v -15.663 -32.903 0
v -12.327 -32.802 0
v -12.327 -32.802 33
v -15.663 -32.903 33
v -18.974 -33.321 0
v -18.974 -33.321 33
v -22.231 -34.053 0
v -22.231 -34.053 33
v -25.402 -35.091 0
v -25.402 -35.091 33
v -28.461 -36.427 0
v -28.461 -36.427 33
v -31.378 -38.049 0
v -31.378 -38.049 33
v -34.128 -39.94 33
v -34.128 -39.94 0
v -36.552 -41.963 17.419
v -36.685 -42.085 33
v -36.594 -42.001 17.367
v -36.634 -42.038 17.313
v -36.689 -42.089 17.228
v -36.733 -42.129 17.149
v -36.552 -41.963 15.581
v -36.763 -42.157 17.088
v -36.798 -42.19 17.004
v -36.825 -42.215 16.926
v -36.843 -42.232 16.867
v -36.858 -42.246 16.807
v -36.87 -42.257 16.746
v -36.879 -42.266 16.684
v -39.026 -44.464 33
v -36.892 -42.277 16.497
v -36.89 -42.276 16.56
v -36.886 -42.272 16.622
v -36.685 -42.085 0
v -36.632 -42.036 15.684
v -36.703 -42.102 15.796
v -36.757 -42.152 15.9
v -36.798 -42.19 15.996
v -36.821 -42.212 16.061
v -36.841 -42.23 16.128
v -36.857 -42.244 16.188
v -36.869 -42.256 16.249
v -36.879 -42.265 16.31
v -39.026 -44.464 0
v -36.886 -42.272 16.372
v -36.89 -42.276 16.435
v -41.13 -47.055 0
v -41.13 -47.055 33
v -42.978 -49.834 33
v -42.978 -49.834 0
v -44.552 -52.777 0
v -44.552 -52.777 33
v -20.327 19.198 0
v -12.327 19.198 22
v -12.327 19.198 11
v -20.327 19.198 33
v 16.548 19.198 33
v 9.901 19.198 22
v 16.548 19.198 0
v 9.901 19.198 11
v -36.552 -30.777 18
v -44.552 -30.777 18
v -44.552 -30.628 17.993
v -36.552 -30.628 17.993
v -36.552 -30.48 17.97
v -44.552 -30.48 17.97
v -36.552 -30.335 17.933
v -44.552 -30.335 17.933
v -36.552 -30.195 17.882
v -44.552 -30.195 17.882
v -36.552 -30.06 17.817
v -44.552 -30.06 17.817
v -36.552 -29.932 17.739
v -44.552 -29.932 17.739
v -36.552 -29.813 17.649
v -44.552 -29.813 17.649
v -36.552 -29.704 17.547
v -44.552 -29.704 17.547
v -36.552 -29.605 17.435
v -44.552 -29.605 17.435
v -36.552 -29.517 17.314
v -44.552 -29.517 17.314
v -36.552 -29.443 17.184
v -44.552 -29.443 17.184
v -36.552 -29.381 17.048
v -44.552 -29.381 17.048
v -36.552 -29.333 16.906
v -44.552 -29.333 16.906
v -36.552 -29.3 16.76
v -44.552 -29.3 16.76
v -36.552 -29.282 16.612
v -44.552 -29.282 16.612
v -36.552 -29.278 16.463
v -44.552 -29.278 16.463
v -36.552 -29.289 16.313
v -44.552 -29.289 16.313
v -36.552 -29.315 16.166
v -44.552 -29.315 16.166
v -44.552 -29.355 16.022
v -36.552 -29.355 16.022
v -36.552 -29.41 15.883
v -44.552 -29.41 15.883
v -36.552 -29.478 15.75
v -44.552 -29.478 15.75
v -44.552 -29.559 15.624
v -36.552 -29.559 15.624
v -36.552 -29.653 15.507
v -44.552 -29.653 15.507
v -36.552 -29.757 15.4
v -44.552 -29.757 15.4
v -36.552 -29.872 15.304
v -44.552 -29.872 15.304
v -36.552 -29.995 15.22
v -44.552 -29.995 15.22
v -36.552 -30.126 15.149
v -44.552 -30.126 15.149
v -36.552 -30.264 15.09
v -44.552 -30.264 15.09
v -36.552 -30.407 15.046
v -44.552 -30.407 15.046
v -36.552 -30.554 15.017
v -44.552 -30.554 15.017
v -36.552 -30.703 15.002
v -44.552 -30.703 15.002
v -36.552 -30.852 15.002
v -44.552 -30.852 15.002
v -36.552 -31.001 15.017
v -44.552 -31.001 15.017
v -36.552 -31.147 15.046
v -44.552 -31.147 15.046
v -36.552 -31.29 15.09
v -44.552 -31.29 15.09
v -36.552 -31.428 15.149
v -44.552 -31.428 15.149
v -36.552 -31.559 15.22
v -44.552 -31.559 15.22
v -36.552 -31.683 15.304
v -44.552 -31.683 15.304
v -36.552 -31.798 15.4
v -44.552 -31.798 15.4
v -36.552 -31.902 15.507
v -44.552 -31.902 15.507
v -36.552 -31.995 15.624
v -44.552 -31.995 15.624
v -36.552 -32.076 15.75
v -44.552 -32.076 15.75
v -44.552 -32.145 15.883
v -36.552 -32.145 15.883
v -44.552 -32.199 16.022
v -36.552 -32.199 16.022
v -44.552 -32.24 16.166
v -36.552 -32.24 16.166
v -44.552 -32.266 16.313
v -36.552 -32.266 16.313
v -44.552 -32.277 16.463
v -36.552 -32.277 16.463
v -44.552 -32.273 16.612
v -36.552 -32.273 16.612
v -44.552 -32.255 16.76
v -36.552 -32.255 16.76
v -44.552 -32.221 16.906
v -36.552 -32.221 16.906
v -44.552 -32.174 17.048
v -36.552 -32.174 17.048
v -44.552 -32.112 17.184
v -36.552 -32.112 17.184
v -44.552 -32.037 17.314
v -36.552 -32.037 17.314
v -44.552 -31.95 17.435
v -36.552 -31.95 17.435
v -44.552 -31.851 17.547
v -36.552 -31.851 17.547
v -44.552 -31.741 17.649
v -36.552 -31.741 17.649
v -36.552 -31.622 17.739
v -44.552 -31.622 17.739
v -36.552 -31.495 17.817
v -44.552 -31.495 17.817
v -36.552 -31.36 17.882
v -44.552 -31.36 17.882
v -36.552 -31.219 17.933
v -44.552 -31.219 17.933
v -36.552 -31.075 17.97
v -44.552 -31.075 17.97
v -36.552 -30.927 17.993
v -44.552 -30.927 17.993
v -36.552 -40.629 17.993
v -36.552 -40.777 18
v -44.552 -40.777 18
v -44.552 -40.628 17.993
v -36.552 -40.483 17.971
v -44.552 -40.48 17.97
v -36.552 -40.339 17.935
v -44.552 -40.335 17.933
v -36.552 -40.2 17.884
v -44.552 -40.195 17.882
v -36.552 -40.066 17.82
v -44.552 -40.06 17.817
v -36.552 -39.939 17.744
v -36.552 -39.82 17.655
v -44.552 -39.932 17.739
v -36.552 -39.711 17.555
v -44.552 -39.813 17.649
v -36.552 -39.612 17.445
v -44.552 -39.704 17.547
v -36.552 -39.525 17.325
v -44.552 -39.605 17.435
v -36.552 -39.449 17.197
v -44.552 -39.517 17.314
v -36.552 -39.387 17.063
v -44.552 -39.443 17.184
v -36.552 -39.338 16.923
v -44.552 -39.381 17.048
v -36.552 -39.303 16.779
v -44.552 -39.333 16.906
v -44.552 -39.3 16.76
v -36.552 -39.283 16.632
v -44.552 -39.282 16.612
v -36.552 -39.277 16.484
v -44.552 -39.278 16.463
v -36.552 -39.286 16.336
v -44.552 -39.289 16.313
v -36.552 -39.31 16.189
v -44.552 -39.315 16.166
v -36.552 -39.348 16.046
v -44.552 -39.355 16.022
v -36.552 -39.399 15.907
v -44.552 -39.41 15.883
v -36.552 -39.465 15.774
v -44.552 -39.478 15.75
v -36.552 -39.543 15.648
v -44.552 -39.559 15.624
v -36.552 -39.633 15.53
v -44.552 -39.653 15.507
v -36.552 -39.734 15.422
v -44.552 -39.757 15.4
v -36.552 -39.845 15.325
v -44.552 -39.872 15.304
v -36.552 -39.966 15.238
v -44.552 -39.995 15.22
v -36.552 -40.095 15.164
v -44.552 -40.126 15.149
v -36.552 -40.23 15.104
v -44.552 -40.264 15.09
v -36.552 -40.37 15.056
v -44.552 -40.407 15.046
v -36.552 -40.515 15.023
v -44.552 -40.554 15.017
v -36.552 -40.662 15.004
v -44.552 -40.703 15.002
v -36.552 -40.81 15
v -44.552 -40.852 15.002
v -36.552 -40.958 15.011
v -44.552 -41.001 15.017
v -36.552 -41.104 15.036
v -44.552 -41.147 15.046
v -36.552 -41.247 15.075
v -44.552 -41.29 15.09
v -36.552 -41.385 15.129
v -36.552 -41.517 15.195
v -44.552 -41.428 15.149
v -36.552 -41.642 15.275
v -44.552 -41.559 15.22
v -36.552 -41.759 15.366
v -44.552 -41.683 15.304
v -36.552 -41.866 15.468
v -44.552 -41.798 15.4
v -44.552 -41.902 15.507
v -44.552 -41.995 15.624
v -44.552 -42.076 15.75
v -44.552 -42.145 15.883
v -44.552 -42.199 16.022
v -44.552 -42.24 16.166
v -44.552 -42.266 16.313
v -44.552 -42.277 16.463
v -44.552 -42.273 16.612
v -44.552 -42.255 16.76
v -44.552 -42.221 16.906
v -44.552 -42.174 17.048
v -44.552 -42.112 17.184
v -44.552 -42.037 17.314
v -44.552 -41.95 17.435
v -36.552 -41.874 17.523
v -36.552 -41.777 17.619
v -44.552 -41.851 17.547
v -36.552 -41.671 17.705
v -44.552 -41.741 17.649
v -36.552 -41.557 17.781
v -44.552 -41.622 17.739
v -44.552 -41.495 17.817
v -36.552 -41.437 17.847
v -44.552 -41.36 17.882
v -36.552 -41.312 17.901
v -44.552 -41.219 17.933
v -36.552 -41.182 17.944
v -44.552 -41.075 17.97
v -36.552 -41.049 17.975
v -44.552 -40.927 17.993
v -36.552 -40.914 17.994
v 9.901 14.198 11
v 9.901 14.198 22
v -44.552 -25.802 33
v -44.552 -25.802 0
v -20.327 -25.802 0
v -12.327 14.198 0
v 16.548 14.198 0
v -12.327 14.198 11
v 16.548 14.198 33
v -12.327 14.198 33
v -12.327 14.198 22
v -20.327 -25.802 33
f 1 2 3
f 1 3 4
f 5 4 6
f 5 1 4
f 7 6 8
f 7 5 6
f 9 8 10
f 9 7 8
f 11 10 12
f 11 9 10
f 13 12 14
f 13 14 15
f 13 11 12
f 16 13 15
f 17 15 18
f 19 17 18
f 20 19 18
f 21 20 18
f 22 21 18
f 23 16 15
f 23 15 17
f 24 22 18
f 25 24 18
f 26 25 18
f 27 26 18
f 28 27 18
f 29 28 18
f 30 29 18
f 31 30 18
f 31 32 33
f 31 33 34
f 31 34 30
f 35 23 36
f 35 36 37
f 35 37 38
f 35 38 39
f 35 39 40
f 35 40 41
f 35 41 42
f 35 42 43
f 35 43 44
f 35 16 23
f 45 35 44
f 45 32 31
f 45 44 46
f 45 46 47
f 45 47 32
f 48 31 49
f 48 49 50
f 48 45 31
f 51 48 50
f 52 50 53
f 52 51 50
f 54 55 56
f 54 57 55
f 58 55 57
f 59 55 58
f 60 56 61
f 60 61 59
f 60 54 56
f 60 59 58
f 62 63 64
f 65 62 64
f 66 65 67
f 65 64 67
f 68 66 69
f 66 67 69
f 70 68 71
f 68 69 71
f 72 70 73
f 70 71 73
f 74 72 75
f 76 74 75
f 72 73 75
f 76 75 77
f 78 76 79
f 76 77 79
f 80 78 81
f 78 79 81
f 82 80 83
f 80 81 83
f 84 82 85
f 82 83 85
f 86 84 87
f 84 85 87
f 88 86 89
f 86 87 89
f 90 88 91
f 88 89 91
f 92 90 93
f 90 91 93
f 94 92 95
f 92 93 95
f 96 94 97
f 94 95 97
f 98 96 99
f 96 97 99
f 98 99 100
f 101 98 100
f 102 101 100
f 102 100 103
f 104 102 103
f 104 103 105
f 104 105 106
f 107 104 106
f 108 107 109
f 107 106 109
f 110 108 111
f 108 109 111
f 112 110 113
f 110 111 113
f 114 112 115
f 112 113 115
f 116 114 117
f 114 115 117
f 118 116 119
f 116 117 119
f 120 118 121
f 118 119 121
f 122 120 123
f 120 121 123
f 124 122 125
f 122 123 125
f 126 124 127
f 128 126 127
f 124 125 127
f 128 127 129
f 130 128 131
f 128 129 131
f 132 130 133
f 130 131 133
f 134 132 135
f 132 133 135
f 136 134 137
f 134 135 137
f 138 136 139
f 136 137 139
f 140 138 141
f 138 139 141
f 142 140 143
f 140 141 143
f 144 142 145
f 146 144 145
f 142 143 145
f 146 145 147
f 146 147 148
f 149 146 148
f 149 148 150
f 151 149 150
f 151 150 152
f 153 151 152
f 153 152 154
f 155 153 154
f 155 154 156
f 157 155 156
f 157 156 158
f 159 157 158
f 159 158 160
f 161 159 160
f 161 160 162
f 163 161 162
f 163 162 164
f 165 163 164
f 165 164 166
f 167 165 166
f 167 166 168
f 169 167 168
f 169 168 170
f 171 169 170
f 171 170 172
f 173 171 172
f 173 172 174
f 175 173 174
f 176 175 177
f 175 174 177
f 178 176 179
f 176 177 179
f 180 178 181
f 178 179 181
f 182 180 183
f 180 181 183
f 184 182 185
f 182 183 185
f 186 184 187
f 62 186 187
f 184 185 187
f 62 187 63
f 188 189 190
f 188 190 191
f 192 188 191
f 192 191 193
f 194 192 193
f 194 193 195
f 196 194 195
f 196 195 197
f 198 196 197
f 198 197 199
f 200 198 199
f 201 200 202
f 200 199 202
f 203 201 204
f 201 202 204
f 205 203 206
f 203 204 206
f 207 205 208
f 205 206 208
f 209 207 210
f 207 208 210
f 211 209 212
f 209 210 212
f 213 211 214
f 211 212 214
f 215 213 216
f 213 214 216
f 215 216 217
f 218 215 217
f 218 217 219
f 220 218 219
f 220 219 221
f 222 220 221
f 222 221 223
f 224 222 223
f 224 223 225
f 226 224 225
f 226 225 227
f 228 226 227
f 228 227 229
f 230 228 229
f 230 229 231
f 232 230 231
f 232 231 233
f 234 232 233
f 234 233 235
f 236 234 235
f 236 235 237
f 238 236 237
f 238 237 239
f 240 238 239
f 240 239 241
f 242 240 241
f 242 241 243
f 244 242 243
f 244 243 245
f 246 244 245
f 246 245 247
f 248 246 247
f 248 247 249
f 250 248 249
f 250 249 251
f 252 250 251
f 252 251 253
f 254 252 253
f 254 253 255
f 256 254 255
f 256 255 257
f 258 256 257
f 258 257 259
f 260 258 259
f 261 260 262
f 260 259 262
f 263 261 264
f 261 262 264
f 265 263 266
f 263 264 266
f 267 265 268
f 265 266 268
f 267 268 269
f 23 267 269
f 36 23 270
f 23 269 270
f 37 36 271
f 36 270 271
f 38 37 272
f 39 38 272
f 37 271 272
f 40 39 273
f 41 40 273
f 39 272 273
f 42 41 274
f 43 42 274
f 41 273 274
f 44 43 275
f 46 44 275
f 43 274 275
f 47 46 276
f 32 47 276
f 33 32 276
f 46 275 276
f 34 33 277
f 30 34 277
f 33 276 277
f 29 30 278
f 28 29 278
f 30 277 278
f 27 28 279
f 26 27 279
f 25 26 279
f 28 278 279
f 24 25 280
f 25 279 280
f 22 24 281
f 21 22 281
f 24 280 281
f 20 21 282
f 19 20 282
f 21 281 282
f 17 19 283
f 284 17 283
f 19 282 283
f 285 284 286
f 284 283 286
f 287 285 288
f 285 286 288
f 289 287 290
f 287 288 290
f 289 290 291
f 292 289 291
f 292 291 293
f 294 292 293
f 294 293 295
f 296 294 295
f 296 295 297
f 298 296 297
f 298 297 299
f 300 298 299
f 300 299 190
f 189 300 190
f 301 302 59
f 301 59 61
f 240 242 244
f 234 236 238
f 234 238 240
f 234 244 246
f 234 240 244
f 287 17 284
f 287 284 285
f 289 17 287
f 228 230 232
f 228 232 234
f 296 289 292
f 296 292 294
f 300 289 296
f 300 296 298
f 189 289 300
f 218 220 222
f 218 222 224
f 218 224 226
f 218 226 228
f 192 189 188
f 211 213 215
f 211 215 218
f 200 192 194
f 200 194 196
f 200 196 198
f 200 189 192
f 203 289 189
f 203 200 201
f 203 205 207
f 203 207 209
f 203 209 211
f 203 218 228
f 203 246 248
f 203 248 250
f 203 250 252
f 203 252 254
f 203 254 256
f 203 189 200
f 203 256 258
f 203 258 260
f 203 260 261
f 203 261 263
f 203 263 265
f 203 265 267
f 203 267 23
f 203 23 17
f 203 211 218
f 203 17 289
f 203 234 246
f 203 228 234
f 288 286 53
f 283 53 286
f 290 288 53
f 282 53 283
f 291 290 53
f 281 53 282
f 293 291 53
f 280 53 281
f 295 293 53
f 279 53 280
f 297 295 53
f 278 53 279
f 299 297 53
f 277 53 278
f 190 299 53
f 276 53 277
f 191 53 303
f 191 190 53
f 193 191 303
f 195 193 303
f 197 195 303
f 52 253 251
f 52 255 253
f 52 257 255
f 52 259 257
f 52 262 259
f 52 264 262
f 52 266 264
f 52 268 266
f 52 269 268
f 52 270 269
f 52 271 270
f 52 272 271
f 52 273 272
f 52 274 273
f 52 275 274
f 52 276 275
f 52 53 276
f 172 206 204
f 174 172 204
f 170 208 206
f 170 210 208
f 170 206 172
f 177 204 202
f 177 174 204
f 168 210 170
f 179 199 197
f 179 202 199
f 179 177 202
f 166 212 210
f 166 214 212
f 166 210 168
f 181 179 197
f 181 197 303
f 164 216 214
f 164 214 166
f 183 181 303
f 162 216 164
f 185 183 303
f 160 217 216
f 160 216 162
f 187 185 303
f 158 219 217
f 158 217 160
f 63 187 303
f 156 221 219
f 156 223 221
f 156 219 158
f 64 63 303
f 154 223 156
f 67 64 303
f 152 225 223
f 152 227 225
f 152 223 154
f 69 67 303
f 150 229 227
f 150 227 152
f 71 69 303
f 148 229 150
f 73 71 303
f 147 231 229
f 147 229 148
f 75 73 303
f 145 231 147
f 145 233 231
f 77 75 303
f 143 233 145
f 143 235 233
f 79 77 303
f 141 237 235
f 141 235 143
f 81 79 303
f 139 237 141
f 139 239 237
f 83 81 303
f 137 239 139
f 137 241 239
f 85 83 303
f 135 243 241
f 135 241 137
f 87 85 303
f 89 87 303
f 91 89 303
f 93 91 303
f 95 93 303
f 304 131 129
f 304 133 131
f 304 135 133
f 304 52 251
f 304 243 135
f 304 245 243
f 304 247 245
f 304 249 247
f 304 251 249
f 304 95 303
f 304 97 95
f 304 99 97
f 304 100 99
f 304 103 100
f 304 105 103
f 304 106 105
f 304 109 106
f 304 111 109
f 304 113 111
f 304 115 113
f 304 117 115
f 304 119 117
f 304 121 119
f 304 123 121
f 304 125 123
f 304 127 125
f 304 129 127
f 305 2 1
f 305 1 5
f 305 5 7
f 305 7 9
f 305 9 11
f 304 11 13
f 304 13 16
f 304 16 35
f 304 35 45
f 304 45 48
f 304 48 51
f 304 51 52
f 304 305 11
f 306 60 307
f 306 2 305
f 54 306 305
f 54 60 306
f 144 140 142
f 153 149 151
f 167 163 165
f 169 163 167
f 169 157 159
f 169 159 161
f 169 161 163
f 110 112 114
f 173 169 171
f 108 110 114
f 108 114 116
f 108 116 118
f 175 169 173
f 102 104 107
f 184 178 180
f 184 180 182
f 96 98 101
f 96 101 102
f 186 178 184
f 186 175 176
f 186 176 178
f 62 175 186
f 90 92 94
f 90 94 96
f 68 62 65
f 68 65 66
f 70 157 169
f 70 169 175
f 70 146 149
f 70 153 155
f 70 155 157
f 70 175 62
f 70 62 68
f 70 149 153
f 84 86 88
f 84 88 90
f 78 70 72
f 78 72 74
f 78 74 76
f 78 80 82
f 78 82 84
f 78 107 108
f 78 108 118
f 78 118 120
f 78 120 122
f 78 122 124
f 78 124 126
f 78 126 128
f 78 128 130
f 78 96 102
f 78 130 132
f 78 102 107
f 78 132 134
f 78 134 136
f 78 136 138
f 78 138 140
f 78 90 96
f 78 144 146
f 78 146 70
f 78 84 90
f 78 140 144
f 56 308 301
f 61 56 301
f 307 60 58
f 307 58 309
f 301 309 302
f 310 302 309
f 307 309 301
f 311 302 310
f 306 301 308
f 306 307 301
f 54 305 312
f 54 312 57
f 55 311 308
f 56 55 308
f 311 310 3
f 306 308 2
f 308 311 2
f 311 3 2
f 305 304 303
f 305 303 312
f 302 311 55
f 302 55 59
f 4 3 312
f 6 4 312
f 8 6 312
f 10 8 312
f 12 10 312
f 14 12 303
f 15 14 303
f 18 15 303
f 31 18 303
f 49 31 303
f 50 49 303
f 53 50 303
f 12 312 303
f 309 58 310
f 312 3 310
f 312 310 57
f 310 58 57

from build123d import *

# Parameters (mm, degrees)
BOSS_EXTRUDE1_DEPTH     = 33
CUT_EXTRUDE1_DEPTH      = 91.853055804
CUT_EXTRUDE1_DEPTH_BACK = 10
SKETCH2_W               = 22.2275
SKETCH2_H               = 11
SKETCH3_R               = 1.5
CUT_EXTRUDE2_DEPTH      = 8


with BuildPart() as part:
    # Sketch1 → Boss-Extrude1 (new body)
    with BuildSketch(Plane.XY):
        with BuildLine():
            Line((-20.326959821, 19.197684275), (16.548040179, 19.197684275))
            Line((16.548040179, 19.197684275), (16.548040179, 14.197684275))
            Line((16.548040179, 14.197684275), (-12.326959821, 14.197684275))
            Line((-12.326959821, 14.197684275), (-12.326959821, -32.802315725))
            ThreePointArc((-12.326959821, -32.802315725), (-31.378402335, -38.048517976), (-44.551959821, -52.777315725))
            Line((-44.551959821, -52.777315725), (-44.551959821, -25.802315725))
            Line((-44.551959821, -25.802315725), (-20.326959821, -25.802315725))
            Line((-20.326959821, -25.802315725), (-20.326959821, 14.197684275))
            Line((-20.326959821, 14.197684275), (-20.326959821, 19.197684275))
        make_face()
    extrude(amount=BOSS_EXTRUDE1_DEPTH)

    # Sketch2 → Cut-Extrude1 (cut, two sides: drawn at the far end of the back side and taken through both)
    with BuildSketch(Plane(origin=(0, 19.197684275, 0), x_dir=(1, 0, 0), z_dir=(0, 1, 0)).offset(-CUT_EXTRUDE1_DEPTH_BACK)):
        with Locations((-1.213209821, -16.5)):
            Rectangle(SKETCH2_W, SKETCH2_H)
    extrude(amount=CUT_EXTRUDE1_DEPTH + CUT_EXTRUDE1_DEPTH_BACK, mode=Mode.SUBTRACT)

    # Sketch3 → Cut-Extrude2 (cut)
    with BuildSketch(Plane.ZY.offset(44.551959821)):
        with Locations((16.5, -40.777315725)):
            Circle(SKETCH3_R)
        with Locations((16.5, -30.777315725)):
            Circle(SKETCH3_R)
    extrude(amount=-CUT_EXTRUDE2_DEPTH, mode=Mode.SUBTRACT)


solid = part.part
